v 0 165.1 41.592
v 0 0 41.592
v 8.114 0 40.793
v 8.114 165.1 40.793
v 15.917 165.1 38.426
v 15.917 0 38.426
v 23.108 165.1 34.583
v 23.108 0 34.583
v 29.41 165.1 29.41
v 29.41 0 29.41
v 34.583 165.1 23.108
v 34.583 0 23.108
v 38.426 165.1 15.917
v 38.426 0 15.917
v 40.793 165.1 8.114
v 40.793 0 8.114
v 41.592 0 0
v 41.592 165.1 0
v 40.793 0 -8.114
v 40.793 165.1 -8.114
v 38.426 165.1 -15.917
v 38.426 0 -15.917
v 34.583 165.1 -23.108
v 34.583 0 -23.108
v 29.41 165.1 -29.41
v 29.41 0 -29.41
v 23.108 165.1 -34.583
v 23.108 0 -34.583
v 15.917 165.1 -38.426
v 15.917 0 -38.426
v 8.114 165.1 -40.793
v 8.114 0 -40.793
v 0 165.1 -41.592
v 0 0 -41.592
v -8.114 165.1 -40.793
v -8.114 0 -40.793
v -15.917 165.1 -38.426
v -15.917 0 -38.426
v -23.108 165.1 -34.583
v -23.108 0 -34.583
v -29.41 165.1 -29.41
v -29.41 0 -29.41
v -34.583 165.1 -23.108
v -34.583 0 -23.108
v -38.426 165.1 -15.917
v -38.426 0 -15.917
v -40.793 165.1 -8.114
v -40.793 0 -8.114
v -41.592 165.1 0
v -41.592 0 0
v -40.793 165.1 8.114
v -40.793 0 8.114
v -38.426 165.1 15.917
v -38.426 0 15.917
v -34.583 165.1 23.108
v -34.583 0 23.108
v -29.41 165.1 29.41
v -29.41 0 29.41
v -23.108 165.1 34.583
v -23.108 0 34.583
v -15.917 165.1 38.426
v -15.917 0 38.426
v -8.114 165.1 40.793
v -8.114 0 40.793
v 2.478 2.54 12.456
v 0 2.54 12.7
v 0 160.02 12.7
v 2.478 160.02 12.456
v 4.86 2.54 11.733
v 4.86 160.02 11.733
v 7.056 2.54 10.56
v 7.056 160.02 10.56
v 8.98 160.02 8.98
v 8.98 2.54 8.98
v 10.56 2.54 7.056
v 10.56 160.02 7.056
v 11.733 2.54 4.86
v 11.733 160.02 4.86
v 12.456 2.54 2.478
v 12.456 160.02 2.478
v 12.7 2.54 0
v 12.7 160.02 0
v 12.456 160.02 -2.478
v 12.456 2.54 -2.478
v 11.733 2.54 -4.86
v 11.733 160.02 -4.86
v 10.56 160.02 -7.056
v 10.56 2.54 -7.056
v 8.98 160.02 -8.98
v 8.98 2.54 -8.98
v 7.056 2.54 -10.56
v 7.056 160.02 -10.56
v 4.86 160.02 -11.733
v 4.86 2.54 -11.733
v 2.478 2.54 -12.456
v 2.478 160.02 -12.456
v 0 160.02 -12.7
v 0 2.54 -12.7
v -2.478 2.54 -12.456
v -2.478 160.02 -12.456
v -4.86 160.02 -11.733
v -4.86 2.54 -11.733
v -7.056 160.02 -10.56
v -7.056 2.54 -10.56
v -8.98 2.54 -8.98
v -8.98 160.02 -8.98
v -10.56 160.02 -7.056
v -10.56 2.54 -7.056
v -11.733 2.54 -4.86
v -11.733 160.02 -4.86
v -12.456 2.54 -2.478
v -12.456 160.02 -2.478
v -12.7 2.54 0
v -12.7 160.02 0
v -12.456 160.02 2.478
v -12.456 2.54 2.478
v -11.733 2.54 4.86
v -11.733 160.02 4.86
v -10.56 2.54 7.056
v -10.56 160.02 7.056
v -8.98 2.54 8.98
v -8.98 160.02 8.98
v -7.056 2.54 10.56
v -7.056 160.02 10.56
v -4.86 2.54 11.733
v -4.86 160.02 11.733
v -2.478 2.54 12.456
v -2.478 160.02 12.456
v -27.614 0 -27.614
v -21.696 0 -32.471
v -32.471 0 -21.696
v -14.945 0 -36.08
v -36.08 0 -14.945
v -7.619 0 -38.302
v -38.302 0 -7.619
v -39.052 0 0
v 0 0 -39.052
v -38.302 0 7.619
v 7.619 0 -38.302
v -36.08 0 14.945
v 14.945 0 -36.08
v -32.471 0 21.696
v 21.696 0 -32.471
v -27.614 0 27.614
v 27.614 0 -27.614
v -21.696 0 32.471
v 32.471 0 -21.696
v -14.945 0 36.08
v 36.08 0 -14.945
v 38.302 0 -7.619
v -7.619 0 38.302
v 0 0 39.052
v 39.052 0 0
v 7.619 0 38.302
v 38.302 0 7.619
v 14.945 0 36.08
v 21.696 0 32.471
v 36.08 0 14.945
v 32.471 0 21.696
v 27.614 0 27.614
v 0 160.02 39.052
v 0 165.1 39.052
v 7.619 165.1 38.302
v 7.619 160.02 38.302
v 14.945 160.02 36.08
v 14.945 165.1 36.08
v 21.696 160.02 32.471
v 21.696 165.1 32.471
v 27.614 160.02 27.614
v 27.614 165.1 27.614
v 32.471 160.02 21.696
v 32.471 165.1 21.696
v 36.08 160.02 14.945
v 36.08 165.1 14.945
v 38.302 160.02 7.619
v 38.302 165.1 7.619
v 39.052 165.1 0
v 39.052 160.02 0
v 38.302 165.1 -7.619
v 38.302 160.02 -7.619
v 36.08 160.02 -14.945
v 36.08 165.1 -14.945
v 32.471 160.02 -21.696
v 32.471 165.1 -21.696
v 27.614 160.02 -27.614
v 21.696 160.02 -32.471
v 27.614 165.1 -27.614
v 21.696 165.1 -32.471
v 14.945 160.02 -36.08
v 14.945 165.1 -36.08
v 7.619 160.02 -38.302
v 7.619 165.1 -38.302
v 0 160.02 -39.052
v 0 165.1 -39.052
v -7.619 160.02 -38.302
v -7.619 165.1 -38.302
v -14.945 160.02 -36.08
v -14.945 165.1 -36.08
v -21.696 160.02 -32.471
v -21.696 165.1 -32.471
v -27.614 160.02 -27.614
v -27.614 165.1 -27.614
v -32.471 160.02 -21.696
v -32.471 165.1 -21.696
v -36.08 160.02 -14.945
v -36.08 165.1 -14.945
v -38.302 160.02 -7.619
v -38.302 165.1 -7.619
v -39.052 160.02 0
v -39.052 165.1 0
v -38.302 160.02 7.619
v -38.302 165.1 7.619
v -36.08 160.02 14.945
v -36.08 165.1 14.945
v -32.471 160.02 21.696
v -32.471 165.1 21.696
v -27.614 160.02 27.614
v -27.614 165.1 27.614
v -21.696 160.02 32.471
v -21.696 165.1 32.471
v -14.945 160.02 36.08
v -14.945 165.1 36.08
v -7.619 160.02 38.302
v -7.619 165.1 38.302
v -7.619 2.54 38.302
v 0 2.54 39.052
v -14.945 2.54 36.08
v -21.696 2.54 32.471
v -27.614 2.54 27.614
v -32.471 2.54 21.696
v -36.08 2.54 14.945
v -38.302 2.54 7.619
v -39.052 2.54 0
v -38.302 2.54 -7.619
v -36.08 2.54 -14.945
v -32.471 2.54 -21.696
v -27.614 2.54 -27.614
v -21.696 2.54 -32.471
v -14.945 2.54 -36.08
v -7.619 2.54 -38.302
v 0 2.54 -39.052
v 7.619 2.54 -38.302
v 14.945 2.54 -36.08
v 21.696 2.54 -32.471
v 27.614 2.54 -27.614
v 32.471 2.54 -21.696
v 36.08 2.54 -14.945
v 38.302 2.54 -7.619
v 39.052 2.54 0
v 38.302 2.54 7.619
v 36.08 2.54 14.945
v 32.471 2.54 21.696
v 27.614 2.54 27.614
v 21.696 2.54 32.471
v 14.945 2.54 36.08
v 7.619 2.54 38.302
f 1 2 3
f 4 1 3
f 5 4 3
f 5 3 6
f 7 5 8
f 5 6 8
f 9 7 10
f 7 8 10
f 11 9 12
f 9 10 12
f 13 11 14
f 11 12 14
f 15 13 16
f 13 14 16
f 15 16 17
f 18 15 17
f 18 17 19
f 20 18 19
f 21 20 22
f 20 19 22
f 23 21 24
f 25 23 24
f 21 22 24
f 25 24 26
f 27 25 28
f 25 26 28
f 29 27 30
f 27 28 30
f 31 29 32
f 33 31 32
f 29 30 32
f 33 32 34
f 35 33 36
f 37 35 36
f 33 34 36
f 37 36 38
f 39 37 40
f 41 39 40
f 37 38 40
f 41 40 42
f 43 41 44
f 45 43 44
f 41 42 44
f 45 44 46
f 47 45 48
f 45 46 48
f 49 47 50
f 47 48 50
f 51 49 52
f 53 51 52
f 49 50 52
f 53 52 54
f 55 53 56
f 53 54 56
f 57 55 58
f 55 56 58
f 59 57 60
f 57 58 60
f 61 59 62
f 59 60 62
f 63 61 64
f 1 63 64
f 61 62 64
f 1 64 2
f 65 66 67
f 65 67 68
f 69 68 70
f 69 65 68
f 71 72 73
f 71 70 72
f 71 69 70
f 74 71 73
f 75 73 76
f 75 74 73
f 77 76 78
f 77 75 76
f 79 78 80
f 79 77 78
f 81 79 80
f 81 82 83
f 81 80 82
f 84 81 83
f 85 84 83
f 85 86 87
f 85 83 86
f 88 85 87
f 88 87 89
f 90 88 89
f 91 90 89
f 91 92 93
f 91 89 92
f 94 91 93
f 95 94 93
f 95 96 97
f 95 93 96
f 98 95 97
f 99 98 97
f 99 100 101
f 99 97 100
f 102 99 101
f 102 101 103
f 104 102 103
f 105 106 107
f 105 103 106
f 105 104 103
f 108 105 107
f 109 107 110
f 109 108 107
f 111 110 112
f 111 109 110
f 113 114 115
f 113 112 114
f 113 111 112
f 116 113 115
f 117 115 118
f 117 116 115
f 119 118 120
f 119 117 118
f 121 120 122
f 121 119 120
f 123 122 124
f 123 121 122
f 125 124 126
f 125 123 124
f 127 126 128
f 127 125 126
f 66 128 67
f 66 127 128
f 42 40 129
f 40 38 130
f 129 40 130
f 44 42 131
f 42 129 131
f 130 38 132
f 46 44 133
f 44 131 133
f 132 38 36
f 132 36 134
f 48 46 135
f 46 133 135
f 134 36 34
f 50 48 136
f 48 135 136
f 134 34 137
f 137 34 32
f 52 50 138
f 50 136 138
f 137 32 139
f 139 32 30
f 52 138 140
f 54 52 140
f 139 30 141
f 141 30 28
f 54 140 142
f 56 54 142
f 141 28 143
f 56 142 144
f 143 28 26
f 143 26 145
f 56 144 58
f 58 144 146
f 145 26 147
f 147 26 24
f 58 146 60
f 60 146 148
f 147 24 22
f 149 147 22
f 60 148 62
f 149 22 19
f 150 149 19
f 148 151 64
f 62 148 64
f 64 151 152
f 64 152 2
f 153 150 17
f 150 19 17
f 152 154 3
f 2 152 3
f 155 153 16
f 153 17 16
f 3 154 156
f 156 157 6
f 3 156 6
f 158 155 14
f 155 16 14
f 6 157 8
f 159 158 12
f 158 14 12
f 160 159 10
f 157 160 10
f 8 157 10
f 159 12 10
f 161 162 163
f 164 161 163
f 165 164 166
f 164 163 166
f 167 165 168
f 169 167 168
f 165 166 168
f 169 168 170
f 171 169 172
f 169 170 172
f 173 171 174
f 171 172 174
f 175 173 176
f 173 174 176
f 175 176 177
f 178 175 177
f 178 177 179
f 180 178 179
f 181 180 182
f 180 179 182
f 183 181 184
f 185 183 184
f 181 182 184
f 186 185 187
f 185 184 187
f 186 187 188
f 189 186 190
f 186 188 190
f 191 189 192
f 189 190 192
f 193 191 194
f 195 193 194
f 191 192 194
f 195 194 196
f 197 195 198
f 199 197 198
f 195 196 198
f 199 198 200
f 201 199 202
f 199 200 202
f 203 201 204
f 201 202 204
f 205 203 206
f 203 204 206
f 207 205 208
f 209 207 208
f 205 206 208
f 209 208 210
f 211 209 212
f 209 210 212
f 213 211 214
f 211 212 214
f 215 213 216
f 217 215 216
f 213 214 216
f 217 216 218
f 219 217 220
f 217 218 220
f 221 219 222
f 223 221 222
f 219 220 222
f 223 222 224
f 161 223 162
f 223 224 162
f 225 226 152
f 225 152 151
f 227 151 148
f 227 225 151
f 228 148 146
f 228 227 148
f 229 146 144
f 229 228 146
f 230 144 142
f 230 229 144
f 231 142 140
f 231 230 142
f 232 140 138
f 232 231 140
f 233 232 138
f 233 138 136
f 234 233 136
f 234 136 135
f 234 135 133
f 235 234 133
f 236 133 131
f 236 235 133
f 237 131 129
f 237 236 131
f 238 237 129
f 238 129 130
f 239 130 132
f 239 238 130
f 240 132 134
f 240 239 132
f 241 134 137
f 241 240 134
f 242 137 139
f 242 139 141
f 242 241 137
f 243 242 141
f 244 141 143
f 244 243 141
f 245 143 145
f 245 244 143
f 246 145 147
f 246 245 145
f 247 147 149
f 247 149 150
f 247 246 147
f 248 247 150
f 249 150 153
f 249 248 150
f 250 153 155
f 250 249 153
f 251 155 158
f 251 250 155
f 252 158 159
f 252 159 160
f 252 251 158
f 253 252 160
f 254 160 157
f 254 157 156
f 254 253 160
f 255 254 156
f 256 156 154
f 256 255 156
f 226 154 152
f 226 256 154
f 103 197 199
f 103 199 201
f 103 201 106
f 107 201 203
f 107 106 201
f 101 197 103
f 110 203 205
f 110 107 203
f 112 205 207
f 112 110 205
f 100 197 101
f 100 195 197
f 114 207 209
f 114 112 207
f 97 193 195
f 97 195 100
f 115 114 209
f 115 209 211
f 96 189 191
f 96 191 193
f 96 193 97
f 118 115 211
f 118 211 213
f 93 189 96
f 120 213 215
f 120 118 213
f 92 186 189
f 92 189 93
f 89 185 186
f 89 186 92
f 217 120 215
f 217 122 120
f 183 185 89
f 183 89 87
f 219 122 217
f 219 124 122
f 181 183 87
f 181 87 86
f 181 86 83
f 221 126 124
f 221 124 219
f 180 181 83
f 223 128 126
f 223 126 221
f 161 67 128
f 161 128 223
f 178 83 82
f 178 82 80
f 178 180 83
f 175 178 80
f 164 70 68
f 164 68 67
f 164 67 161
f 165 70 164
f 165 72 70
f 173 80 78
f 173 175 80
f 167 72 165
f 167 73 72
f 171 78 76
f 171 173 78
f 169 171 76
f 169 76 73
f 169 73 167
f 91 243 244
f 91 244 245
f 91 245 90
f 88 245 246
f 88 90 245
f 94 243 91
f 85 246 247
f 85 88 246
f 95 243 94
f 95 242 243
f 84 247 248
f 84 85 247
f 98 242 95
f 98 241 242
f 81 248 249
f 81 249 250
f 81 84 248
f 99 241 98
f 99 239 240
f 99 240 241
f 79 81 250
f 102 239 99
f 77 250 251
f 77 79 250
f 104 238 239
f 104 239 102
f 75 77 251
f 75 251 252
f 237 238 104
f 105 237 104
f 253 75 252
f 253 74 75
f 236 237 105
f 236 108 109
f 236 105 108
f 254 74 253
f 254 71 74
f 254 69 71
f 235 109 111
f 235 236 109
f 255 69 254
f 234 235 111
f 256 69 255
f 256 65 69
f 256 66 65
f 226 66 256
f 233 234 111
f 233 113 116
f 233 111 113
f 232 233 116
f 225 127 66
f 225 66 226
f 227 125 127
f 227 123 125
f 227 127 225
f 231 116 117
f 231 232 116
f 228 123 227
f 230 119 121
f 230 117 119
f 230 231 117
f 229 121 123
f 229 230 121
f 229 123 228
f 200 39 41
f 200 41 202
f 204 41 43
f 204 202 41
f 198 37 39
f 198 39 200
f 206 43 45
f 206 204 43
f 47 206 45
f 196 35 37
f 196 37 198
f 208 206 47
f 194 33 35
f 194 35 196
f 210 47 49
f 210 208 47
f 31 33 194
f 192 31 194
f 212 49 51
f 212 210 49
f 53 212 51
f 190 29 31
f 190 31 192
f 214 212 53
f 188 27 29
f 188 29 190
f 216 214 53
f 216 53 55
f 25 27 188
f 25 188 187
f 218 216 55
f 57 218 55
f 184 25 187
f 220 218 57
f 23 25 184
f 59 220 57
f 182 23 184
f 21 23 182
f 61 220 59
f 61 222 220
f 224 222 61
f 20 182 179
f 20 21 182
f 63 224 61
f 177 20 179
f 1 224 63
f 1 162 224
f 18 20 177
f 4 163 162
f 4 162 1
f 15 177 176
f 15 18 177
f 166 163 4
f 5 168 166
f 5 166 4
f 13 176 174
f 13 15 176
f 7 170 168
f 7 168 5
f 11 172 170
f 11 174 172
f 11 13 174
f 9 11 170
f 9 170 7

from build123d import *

# Parameters (mm, degrees)
SKETCH1_R               = 41.5925
BOSS_EXTRUDE1_DEPTH     = 165.1
CUT_EXTRUDE1_DEPTH      = 176.265176554
CUT_EXTRUDE1_DEPTH_BACK = 176.265176554
SKETCH2_R               = 12.7
SKETCH3_R               = 39.0525
CUT_EXTRUDE2_DEPTH      = 5.08
CUT_EXTRUDE3_START      = -2.54
SKETCH4_R               = 39.0525
SKETCH4_R_2             = 12.7
CUT_EXTRUDE3_DEPTH      = 2.54


with BuildPart() as part:
    # Sketch1 → Boss-Extrude1 (new body)
    with BuildSketch(Plane(origin=(0, 0, 0), x_dir=(1, 0, 0), z_dir=(0, 1, 0))):
        with Locations(Location((0, 0, 0), (0, 0, 270))):
            Circle(SKETCH1_R)
    extrude(amount=BOSS_EXTRUDE1_DEPTH)

    # Sketch2 → Cut-Extrude1 (cut, two sides: drawn at the far end of the back side and taken through both)
    with BuildSketch(Plane(origin=(0, 165.1, 0), x_dir=(1, 0, 0), z_dir=(0, 1, 0)).offset(-CUT_EXTRUDE1_DEPTH_BACK)):
        with Locations(Location((0, 0, 0), (0, 0, 270))):
            Circle(SKETCH2_R)
    extrude(amount=CUT_EXTRUDE1_DEPTH + CUT_EXTRUDE1_DEPTH_BACK, mode=Mode.SUBTRACT)

    # Sketch3 → Cut-Extrude2 (cut)
    with BuildSketch(Plane(origin=(0, 165.1, 0), x_dir=(1, 0, 0), z_dir=(0, 1, 0))):
        with Locations(Location((0, 0, 0), (0, 0, 270))):
            Circle(SKETCH3_R)
    extrude(amount=-CUT_EXTRUDE2_DEPTH, mode=Mode.SUBTRACT)

    # Sketch4 → Cut-Extrude3 (cut)
    with BuildSketch(Plane.XZ.offset(CUT_EXTRUDE3_START)):
        with Locations(Location((0, 0, 0), (0, 0, 90))):
            Circle(SKETCH4_R)
        with Locations(Location((0, 0, 0), (0, 0, 90))):
            Circle(SKETCH4_R_2, mode=Mode.SUBTRACT)
    extrude(amount=CUT_EXTRUDE3_DEPTH, mode=Mode.SUBTRACT)


solid = part.part
